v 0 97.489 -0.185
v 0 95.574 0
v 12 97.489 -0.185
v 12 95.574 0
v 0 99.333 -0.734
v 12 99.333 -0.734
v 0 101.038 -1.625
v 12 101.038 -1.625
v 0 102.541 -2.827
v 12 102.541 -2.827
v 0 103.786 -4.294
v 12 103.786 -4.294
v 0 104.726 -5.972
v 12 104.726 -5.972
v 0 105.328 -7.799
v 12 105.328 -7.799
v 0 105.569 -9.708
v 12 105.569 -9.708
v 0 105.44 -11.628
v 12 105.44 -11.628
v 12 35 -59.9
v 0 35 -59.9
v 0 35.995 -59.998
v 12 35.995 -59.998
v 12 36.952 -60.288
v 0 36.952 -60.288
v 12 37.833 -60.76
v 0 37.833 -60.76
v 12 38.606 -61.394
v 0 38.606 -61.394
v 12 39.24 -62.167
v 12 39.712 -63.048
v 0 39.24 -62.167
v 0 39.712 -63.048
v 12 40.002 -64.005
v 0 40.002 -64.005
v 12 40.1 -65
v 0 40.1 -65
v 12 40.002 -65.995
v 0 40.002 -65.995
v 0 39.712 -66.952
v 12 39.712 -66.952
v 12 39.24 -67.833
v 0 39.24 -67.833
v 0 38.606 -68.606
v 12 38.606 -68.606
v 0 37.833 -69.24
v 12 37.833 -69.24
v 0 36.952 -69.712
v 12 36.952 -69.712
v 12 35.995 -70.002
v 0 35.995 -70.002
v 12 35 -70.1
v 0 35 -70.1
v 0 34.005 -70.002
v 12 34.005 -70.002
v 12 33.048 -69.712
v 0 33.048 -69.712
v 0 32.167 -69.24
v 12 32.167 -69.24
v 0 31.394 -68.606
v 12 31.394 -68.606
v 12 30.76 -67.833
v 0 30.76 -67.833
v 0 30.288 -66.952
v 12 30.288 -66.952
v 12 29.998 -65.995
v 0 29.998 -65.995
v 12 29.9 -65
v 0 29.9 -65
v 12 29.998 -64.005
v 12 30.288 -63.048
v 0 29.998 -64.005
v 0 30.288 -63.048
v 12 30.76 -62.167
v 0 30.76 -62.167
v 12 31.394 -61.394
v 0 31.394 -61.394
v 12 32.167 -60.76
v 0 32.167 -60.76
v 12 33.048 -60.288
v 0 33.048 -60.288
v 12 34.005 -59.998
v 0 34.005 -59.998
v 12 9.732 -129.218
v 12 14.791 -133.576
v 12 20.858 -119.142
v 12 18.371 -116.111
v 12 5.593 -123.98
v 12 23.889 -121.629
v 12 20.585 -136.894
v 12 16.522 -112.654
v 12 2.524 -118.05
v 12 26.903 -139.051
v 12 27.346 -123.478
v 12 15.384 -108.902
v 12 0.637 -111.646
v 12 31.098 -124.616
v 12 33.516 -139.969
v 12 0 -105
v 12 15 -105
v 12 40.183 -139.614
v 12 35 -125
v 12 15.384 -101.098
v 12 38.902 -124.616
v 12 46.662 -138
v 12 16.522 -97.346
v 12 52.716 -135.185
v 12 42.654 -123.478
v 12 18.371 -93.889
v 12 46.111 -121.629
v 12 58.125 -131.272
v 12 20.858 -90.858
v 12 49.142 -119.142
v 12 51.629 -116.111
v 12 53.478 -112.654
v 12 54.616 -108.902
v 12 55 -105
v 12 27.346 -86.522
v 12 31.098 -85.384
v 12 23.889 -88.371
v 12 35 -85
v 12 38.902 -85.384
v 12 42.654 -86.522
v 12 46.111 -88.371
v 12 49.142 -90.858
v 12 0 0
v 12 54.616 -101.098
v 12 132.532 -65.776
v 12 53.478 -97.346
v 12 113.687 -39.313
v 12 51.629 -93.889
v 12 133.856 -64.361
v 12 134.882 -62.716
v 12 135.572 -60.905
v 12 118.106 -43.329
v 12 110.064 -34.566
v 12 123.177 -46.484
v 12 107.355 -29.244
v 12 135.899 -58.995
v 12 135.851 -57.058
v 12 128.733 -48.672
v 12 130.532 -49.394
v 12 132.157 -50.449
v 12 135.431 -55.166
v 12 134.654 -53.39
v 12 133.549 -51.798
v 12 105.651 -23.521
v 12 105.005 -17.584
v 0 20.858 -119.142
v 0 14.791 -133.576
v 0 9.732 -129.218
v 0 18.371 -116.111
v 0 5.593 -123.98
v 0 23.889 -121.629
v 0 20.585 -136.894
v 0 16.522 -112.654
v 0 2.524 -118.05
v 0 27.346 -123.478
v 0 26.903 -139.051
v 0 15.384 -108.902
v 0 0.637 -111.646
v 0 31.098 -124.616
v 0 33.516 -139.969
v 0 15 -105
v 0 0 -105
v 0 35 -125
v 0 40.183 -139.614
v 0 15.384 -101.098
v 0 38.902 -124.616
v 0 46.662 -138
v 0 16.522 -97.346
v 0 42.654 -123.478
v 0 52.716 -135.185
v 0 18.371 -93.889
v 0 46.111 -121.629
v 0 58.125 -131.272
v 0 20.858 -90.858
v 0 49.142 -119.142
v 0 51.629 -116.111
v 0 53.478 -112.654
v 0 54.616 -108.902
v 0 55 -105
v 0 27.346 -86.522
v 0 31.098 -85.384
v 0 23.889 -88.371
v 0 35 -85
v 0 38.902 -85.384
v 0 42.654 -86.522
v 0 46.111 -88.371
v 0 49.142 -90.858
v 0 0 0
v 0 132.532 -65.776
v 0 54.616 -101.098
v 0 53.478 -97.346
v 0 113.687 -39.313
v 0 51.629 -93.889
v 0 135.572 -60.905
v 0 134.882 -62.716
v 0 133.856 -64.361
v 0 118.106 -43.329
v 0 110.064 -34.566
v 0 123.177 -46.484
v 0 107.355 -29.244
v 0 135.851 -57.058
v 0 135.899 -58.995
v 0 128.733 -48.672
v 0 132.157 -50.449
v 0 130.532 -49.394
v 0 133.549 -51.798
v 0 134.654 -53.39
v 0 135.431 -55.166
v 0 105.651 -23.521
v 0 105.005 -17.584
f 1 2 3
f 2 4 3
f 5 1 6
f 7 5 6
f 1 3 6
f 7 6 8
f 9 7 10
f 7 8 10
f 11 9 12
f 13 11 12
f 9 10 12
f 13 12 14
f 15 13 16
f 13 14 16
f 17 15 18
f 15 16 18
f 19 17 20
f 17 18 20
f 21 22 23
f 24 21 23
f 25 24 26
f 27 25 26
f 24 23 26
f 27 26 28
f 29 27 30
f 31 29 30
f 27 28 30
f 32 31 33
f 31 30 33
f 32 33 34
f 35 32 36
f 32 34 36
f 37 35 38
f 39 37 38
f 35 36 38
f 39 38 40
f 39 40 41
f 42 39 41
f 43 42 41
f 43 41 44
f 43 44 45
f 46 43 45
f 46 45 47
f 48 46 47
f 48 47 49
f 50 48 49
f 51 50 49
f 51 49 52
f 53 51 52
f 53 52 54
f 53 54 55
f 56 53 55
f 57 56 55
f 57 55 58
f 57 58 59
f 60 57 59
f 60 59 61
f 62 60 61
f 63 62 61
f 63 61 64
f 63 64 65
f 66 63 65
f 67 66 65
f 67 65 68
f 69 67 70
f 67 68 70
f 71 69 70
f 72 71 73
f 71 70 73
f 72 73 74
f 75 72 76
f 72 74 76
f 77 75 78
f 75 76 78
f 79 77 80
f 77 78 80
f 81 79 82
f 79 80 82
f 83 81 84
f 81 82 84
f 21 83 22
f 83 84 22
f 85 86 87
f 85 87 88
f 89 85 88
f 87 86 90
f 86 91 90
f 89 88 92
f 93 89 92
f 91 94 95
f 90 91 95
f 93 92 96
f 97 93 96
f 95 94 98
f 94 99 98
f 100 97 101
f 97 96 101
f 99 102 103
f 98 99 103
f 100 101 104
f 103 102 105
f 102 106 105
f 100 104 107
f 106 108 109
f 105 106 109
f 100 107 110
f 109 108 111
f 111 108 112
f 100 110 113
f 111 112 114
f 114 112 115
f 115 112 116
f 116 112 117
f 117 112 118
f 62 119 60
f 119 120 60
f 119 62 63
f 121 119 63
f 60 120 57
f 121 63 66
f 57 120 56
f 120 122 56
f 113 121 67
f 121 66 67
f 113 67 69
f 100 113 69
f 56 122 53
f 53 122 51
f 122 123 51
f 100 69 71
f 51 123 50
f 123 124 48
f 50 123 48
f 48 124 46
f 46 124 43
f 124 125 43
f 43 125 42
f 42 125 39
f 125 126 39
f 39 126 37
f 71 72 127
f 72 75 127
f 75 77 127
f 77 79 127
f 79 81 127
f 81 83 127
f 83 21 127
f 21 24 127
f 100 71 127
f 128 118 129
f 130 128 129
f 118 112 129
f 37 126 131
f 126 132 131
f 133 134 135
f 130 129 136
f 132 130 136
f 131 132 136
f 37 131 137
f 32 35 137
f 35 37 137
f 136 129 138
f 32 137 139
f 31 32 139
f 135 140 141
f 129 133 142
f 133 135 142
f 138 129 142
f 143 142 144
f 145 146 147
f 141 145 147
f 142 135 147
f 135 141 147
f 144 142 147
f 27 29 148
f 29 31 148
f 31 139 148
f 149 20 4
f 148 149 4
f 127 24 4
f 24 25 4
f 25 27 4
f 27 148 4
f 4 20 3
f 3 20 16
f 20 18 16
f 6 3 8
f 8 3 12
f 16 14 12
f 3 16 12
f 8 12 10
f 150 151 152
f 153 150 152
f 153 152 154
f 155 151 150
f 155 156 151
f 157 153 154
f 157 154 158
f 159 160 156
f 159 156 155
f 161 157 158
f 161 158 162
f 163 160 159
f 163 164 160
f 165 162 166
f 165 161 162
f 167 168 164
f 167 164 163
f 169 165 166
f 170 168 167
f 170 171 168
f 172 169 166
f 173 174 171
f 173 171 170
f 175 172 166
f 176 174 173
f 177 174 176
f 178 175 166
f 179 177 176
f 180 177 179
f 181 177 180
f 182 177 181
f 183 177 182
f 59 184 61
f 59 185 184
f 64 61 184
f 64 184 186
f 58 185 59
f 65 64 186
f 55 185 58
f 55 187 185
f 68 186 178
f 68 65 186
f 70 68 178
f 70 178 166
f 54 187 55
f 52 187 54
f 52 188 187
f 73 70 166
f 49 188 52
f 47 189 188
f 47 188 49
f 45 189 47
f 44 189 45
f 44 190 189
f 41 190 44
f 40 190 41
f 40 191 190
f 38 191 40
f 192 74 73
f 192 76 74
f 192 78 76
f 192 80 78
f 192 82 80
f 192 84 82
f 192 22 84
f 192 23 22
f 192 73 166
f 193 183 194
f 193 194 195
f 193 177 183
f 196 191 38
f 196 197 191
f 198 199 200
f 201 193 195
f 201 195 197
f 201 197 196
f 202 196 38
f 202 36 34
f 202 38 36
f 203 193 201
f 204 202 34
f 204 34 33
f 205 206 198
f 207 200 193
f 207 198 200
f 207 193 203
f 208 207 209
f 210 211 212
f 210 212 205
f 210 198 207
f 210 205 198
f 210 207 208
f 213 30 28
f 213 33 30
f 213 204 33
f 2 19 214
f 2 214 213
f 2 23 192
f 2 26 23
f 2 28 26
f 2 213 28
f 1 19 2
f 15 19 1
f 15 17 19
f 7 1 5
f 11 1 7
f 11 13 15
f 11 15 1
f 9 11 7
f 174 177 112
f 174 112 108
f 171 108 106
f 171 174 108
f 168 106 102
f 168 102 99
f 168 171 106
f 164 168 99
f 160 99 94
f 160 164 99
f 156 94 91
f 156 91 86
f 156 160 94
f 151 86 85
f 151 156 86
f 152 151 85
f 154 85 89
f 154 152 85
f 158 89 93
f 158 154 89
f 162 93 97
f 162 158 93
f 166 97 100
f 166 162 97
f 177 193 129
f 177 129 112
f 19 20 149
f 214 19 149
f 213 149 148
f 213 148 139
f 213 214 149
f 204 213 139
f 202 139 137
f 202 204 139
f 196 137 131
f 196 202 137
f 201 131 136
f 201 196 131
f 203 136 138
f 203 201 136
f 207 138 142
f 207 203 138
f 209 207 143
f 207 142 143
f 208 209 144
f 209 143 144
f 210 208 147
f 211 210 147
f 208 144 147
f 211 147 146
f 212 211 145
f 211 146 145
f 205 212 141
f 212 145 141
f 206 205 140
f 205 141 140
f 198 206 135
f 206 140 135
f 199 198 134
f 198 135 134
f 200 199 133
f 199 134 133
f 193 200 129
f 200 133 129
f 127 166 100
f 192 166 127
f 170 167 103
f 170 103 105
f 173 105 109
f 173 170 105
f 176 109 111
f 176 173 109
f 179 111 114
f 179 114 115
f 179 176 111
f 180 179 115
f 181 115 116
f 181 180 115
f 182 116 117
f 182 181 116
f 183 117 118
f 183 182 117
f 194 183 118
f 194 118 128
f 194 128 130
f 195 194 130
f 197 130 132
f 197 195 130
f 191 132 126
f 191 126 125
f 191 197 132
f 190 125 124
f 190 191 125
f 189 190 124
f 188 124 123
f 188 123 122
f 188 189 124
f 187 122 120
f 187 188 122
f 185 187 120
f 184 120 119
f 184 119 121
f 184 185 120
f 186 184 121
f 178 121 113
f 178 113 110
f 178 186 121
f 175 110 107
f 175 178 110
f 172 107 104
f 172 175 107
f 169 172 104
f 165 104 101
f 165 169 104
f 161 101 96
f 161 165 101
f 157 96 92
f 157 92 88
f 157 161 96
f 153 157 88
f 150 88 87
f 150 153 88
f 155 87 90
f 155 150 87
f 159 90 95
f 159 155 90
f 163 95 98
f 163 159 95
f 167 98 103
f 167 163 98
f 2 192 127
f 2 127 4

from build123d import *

# Parameters (mm, degrees)
SKETCH_1_R          = 20
EXTRUDE_1_DEPTH     = 12
FILLET_1_R          = 10
HOLE_WIZARD_M12_1_D = 10.2


with BuildPart() as part:
    # 草图1 → 凸台-拉伸1 (new body)
    with BuildSketch(Plane(origin=(0, 0, 0), x_dir=(0, 0, -1), z_dir=(1, 0, 0))):
        with BuildLine():
            Line((0, 0), (0, 109.715728753))
            ThreePointArc((0, 109.715728753), (42.343741696, 116.864845474), (41.770630196, 159.804033565))
            Line((41.770630196, 159.804033565), (131.271880511, 58.125490145))
            ThreePointArc((131.271880511, 58.125490145), (136.893511527, 20.584594266), (105, 0))
            Line((105, 0), (0, 0))
        make_face()
        with Locations((105, 35)):
            Circle(SKETCH_1_R, mode=Mode.SUBTRACT)
    extrude(amount=EXTRUDE_1_DEPTH)

    # 圆角1
    fillet_1_edges = [part.edges().sort_by_distance(p)[0] for p in [
        (6, 109.715728753, 0),
        (6, 159.804033565, -41.770630196),
    ]]
    fillet(fillet_1_edges, radius=FILLET_1_R)

    # M12 螺纹孔1 (through all)
    with Locations(Plane(origin=(12, 0, 0), x_dir=(0, 0, -1), z_dir=(1, 0, 0))):
        with Locations((65, 35)):
            Hole(HOLE_WIZARD_M12_1_D / 2)


solid = part.part
